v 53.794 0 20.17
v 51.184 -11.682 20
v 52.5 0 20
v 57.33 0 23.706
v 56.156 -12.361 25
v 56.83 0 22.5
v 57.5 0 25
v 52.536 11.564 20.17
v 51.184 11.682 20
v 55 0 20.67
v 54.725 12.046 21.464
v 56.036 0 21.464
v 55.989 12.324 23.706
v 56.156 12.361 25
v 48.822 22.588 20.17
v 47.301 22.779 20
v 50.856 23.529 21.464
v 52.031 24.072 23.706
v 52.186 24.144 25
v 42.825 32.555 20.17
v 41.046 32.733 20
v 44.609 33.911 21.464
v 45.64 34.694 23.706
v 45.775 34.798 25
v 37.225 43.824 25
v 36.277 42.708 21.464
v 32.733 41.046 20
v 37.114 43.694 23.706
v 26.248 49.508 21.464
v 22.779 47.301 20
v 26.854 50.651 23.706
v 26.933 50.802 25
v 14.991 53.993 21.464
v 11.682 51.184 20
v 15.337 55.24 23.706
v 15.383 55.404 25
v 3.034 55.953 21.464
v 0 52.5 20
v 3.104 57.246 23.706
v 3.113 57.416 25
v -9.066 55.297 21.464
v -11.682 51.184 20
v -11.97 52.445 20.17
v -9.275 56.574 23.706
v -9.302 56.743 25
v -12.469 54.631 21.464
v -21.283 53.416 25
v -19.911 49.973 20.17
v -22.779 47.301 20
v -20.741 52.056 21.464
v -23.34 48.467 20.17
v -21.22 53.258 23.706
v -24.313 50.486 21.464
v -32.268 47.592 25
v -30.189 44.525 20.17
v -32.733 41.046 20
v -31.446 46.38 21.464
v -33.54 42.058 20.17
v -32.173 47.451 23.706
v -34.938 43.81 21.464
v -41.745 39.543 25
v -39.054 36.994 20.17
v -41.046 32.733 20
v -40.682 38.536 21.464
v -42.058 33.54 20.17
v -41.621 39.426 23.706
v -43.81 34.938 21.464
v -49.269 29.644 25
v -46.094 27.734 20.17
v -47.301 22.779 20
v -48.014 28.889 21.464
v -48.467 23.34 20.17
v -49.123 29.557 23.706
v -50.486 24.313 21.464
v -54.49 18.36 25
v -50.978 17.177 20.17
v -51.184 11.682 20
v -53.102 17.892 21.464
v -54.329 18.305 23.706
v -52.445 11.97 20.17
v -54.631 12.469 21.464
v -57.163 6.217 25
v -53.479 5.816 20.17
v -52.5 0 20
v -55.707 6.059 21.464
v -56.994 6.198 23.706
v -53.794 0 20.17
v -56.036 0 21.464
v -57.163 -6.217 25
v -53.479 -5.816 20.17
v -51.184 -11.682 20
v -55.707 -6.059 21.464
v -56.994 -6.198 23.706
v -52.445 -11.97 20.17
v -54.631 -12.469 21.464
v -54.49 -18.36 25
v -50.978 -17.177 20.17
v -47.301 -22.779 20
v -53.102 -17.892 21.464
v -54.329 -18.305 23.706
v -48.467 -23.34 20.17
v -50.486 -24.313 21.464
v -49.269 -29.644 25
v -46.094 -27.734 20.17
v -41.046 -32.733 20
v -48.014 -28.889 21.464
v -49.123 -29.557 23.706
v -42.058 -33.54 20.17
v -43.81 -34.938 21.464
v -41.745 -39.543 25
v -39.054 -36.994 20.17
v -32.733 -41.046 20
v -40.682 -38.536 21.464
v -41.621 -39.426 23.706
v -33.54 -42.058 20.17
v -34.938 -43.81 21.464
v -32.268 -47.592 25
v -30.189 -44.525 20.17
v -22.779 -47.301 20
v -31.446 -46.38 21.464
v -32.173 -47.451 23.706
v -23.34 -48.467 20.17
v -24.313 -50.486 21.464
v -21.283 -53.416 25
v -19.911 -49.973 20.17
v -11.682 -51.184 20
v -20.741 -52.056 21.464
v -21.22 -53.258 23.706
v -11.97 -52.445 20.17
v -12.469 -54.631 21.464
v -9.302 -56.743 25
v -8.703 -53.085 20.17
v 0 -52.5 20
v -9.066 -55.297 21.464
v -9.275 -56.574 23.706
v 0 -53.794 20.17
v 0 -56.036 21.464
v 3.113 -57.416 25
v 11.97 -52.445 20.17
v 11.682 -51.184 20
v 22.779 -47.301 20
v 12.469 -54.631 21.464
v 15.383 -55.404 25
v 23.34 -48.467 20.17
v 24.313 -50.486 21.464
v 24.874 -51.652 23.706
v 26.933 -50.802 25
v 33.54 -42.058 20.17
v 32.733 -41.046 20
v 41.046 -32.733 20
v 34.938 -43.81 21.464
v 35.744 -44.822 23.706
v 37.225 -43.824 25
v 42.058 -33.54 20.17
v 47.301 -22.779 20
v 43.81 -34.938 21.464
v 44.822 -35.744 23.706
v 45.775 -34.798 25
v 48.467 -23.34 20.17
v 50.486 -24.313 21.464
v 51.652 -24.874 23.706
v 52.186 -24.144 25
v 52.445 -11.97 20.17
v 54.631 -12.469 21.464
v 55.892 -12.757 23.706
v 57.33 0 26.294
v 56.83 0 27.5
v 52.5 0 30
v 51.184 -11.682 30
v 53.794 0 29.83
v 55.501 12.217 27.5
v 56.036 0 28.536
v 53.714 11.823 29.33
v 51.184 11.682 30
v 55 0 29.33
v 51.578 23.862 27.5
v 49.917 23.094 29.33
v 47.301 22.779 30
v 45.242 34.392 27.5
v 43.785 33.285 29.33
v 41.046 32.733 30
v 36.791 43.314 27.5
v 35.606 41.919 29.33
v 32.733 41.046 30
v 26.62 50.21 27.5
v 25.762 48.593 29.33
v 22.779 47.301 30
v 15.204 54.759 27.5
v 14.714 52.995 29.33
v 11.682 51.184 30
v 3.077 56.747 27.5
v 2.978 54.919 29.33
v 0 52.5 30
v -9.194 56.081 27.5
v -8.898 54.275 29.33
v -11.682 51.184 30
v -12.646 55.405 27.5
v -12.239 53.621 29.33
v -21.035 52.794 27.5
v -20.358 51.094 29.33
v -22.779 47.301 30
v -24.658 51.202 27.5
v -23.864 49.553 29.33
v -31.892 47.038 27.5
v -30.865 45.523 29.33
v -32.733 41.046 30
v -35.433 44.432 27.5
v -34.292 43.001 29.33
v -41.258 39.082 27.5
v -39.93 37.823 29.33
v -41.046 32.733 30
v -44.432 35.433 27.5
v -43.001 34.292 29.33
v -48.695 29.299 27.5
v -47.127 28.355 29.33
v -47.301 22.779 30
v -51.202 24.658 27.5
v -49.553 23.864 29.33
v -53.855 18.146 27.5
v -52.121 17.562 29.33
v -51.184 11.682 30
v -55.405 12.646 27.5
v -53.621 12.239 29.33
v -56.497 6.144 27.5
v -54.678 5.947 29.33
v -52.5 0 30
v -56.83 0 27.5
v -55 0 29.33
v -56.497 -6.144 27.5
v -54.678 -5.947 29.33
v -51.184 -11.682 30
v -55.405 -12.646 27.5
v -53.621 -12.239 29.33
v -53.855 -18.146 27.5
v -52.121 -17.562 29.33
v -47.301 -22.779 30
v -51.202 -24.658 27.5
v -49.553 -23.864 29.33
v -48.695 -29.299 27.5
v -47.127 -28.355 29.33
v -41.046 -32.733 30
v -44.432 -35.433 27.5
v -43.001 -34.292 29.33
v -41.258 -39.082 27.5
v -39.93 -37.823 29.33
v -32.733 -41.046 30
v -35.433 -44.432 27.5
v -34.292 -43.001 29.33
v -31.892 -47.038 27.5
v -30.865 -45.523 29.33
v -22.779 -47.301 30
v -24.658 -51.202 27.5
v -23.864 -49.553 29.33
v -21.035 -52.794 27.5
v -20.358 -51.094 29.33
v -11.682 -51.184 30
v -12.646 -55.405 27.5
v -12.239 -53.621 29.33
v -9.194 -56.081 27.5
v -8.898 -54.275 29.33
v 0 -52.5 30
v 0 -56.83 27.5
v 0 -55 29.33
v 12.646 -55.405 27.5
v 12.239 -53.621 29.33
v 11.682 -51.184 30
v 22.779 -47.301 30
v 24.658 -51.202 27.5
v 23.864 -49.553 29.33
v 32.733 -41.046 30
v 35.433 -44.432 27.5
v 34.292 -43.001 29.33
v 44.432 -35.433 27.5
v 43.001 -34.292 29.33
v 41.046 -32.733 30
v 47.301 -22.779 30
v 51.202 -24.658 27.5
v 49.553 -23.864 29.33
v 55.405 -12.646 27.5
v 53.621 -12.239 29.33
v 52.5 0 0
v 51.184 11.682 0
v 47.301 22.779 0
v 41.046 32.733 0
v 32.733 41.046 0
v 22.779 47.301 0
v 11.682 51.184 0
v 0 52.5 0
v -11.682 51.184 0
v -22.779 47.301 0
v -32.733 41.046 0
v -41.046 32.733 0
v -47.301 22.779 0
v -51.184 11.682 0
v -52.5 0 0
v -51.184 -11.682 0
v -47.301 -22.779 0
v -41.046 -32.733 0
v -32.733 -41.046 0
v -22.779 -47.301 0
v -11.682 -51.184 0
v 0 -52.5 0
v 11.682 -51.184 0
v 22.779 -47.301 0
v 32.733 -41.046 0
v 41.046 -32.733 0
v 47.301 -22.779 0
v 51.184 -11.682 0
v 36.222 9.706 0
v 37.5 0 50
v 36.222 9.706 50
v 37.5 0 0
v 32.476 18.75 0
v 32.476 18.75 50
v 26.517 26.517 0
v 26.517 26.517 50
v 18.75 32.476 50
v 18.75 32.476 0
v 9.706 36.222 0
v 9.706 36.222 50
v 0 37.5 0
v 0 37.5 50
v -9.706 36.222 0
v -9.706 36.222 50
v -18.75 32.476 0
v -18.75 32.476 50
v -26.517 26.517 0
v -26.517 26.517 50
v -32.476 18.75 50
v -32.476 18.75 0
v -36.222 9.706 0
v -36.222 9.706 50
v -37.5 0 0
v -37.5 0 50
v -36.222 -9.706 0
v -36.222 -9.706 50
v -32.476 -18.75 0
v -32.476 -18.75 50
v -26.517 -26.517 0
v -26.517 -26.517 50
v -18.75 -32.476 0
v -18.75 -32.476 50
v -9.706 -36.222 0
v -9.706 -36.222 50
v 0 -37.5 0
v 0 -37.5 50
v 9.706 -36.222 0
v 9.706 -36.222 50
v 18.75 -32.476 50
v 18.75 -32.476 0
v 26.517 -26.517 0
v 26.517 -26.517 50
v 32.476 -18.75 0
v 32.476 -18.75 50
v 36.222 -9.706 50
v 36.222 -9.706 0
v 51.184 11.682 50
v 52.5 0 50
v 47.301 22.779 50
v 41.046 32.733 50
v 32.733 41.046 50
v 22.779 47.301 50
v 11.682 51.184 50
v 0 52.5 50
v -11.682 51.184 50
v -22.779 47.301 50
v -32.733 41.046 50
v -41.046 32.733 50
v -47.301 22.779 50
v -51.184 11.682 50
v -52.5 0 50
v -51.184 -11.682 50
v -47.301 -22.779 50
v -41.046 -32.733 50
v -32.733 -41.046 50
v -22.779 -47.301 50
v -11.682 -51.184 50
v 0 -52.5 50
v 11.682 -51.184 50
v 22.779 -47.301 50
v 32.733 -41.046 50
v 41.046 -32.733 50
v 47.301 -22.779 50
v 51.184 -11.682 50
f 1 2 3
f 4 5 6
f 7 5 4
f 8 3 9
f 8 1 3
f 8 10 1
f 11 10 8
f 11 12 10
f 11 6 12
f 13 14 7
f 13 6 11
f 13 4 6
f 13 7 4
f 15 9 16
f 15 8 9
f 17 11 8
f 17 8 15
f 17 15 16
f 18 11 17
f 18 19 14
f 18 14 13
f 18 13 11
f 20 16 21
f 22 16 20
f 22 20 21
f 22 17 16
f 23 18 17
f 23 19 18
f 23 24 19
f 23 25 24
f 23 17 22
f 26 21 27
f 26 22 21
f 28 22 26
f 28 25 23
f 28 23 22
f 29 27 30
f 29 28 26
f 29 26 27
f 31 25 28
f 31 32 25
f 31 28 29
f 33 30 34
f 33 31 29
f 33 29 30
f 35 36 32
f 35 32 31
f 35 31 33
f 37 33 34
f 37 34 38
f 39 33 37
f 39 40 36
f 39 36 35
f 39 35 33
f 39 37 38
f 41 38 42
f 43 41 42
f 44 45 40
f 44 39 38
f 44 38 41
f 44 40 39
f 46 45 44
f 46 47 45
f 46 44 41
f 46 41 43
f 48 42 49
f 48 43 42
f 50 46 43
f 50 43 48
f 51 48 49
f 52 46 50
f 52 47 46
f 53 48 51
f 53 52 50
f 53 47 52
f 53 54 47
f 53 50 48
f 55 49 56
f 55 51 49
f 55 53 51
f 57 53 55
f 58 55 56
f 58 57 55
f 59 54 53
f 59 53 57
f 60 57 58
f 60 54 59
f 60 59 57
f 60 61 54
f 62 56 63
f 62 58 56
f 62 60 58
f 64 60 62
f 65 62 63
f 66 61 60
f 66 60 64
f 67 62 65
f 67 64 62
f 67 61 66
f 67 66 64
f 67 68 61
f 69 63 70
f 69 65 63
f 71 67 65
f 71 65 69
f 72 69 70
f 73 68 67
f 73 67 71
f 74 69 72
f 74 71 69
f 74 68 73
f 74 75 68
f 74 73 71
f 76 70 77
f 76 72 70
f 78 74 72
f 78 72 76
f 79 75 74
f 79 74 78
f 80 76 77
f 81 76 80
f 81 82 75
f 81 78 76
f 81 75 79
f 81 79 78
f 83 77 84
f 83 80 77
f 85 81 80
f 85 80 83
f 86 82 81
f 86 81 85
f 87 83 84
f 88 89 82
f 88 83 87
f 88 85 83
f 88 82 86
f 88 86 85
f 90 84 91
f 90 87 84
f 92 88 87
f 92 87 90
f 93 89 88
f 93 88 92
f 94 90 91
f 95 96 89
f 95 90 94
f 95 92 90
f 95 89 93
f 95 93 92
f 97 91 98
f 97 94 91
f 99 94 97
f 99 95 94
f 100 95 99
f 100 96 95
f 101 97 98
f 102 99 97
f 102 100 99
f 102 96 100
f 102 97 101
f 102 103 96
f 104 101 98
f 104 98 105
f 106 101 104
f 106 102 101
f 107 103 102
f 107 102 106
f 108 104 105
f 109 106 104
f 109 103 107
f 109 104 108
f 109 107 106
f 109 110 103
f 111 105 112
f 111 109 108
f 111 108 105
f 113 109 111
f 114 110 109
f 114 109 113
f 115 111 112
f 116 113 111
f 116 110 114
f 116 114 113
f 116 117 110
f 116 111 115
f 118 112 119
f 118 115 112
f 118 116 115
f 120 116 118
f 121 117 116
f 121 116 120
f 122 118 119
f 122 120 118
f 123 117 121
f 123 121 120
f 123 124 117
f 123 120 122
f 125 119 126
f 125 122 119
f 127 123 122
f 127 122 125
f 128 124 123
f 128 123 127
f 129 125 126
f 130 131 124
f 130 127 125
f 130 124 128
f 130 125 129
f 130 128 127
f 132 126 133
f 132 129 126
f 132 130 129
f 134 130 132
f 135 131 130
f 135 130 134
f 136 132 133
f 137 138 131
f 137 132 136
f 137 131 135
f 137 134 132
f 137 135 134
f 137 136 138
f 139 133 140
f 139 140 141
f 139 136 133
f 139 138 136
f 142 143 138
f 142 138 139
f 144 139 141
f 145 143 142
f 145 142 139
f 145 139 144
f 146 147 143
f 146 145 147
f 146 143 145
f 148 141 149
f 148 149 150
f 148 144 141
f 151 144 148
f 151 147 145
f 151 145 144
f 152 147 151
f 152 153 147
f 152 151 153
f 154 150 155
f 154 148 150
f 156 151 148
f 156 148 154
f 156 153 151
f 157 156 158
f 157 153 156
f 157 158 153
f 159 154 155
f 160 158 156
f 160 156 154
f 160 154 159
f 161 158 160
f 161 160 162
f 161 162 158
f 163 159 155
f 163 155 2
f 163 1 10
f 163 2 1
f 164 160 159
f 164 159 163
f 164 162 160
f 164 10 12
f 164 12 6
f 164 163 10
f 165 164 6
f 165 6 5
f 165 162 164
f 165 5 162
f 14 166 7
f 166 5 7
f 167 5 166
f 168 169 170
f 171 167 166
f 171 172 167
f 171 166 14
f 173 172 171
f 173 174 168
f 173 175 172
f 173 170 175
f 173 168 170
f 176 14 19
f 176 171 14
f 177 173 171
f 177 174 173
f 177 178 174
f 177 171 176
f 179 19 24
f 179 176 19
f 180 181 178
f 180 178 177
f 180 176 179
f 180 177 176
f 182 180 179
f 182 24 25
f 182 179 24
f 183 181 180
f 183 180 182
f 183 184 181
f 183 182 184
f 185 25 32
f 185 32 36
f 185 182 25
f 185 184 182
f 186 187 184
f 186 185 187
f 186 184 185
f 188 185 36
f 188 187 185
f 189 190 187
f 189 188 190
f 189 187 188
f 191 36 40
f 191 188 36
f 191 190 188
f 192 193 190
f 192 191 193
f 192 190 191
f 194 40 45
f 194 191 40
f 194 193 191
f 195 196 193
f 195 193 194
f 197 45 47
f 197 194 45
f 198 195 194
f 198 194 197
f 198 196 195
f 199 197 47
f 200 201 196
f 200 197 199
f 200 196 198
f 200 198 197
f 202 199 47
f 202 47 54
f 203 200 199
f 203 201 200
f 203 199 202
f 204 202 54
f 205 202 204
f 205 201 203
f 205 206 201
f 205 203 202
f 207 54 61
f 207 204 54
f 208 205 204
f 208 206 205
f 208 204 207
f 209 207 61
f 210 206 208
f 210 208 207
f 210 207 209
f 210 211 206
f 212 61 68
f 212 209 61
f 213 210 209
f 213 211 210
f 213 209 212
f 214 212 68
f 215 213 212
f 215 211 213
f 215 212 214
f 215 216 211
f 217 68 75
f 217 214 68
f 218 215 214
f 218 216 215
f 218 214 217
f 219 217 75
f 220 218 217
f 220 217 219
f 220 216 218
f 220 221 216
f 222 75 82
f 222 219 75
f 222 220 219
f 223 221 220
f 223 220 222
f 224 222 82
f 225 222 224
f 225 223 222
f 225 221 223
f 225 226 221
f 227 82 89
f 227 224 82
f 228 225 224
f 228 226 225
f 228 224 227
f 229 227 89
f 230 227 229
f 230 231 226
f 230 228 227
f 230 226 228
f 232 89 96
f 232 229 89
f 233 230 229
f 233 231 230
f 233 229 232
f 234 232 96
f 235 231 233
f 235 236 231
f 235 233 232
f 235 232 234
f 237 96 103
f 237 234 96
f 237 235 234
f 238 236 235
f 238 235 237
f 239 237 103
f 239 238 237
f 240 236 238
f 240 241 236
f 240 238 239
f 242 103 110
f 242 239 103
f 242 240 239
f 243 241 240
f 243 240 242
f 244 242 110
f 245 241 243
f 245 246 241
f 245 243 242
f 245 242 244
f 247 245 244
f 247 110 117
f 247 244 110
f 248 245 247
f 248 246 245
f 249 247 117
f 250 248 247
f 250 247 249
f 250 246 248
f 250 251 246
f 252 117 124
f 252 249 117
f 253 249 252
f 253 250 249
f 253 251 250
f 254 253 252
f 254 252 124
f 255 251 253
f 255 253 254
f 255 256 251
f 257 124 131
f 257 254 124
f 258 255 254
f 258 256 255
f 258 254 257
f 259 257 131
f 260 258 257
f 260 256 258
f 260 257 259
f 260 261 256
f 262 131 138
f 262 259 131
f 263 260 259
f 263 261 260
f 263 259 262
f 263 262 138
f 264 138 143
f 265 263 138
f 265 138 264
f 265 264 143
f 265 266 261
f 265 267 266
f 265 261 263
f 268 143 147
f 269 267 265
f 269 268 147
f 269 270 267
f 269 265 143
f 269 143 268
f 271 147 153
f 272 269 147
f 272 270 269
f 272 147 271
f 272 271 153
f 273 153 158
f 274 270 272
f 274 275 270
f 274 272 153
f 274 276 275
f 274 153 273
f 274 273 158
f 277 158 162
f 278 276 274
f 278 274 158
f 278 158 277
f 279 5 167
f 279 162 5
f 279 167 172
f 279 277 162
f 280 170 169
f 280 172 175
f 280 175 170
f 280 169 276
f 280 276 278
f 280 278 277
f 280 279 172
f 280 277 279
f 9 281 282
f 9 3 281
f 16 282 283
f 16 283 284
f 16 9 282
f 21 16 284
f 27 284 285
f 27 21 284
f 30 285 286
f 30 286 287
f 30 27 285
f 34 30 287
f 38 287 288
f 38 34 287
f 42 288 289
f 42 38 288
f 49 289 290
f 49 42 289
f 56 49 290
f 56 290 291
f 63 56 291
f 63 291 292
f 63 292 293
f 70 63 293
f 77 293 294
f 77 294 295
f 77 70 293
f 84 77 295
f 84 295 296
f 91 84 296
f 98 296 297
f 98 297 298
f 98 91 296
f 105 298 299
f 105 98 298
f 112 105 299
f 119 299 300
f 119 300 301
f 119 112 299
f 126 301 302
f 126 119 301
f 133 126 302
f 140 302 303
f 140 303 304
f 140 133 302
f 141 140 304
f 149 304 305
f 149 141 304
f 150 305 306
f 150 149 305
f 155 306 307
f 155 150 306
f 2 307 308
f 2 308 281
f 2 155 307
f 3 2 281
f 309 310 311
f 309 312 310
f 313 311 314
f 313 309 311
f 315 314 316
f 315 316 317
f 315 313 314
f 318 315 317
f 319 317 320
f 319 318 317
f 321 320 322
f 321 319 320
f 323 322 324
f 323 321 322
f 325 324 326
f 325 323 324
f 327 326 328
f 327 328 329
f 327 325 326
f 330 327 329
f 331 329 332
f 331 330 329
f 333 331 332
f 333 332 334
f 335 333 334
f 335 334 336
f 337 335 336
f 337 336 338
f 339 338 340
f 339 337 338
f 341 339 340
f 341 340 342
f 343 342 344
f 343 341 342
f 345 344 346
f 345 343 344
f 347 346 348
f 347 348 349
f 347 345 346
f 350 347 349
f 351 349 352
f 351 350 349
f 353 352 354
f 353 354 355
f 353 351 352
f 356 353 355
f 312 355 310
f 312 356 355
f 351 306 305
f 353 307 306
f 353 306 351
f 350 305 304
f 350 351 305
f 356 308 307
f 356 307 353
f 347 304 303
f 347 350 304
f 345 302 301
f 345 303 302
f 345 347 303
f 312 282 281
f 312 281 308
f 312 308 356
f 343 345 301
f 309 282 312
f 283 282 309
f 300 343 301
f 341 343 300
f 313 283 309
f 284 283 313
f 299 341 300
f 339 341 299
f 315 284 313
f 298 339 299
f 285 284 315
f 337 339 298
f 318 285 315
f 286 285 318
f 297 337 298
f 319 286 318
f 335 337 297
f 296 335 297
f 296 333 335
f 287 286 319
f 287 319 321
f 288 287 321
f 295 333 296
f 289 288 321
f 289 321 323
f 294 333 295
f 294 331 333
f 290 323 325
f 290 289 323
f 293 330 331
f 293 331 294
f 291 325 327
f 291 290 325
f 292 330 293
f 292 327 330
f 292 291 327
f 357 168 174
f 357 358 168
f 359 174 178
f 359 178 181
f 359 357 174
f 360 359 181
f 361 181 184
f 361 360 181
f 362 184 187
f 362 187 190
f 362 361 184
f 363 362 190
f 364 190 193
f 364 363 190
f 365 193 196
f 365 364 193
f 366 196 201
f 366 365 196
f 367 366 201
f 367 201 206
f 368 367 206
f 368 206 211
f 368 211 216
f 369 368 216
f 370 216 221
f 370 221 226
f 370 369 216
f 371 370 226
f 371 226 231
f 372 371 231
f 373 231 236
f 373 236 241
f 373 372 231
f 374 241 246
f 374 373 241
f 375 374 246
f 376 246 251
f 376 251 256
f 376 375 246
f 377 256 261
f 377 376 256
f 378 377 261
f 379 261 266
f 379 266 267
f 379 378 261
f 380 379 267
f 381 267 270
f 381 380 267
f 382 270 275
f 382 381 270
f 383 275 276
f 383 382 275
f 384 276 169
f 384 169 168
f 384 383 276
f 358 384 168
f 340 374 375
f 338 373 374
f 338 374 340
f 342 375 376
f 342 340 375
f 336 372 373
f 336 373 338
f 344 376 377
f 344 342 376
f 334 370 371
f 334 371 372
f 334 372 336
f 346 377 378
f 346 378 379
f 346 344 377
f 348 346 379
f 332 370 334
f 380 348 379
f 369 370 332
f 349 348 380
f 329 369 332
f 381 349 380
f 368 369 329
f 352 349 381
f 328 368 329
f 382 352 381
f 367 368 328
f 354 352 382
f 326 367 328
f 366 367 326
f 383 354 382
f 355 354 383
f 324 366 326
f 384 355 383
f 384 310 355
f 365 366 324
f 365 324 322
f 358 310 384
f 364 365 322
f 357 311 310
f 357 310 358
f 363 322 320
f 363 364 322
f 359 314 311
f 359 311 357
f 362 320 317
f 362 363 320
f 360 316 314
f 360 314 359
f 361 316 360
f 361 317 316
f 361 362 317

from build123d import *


with BuildPart() as f1:
    # F0 (on Front) → F1 (revolve)
    with BuildSketch(Plane.XZ):
        with BuildLine():
            Line((37.5, 50), (37.5, 0))
            Line((37.5, 0), (52.5, 0))
            Line((52.5, 0), (52.5, 20))
            ThreePointArc((52.5, 20), (47.5, 25), (52.5, 30))
            Line((52.5, 30), (52.5, 50))
            Line((52.5, 50), (37.5, 50))
        make_face()
        with BuildLine():
            ThreePointArc((52.5, 30), (47.5, 25), (52.5, 20))
            Line((52.5, 20), (52.5, 30))
        make_face()
        with BuildLine():
            Line((52.5, 30), (52.5, 20))
            ThreePointArc((52.5, 20), (56.0355339059, 21.4644660941), (57.5, 25))
            ThreePointArc((57.5, 25), (56.0355339059, 28.5355339059), (52.5, 30))
        make_face()
    revolve(axis=Axis((0, 0, 25), (0, 0, 1)))


solid = f1.part
